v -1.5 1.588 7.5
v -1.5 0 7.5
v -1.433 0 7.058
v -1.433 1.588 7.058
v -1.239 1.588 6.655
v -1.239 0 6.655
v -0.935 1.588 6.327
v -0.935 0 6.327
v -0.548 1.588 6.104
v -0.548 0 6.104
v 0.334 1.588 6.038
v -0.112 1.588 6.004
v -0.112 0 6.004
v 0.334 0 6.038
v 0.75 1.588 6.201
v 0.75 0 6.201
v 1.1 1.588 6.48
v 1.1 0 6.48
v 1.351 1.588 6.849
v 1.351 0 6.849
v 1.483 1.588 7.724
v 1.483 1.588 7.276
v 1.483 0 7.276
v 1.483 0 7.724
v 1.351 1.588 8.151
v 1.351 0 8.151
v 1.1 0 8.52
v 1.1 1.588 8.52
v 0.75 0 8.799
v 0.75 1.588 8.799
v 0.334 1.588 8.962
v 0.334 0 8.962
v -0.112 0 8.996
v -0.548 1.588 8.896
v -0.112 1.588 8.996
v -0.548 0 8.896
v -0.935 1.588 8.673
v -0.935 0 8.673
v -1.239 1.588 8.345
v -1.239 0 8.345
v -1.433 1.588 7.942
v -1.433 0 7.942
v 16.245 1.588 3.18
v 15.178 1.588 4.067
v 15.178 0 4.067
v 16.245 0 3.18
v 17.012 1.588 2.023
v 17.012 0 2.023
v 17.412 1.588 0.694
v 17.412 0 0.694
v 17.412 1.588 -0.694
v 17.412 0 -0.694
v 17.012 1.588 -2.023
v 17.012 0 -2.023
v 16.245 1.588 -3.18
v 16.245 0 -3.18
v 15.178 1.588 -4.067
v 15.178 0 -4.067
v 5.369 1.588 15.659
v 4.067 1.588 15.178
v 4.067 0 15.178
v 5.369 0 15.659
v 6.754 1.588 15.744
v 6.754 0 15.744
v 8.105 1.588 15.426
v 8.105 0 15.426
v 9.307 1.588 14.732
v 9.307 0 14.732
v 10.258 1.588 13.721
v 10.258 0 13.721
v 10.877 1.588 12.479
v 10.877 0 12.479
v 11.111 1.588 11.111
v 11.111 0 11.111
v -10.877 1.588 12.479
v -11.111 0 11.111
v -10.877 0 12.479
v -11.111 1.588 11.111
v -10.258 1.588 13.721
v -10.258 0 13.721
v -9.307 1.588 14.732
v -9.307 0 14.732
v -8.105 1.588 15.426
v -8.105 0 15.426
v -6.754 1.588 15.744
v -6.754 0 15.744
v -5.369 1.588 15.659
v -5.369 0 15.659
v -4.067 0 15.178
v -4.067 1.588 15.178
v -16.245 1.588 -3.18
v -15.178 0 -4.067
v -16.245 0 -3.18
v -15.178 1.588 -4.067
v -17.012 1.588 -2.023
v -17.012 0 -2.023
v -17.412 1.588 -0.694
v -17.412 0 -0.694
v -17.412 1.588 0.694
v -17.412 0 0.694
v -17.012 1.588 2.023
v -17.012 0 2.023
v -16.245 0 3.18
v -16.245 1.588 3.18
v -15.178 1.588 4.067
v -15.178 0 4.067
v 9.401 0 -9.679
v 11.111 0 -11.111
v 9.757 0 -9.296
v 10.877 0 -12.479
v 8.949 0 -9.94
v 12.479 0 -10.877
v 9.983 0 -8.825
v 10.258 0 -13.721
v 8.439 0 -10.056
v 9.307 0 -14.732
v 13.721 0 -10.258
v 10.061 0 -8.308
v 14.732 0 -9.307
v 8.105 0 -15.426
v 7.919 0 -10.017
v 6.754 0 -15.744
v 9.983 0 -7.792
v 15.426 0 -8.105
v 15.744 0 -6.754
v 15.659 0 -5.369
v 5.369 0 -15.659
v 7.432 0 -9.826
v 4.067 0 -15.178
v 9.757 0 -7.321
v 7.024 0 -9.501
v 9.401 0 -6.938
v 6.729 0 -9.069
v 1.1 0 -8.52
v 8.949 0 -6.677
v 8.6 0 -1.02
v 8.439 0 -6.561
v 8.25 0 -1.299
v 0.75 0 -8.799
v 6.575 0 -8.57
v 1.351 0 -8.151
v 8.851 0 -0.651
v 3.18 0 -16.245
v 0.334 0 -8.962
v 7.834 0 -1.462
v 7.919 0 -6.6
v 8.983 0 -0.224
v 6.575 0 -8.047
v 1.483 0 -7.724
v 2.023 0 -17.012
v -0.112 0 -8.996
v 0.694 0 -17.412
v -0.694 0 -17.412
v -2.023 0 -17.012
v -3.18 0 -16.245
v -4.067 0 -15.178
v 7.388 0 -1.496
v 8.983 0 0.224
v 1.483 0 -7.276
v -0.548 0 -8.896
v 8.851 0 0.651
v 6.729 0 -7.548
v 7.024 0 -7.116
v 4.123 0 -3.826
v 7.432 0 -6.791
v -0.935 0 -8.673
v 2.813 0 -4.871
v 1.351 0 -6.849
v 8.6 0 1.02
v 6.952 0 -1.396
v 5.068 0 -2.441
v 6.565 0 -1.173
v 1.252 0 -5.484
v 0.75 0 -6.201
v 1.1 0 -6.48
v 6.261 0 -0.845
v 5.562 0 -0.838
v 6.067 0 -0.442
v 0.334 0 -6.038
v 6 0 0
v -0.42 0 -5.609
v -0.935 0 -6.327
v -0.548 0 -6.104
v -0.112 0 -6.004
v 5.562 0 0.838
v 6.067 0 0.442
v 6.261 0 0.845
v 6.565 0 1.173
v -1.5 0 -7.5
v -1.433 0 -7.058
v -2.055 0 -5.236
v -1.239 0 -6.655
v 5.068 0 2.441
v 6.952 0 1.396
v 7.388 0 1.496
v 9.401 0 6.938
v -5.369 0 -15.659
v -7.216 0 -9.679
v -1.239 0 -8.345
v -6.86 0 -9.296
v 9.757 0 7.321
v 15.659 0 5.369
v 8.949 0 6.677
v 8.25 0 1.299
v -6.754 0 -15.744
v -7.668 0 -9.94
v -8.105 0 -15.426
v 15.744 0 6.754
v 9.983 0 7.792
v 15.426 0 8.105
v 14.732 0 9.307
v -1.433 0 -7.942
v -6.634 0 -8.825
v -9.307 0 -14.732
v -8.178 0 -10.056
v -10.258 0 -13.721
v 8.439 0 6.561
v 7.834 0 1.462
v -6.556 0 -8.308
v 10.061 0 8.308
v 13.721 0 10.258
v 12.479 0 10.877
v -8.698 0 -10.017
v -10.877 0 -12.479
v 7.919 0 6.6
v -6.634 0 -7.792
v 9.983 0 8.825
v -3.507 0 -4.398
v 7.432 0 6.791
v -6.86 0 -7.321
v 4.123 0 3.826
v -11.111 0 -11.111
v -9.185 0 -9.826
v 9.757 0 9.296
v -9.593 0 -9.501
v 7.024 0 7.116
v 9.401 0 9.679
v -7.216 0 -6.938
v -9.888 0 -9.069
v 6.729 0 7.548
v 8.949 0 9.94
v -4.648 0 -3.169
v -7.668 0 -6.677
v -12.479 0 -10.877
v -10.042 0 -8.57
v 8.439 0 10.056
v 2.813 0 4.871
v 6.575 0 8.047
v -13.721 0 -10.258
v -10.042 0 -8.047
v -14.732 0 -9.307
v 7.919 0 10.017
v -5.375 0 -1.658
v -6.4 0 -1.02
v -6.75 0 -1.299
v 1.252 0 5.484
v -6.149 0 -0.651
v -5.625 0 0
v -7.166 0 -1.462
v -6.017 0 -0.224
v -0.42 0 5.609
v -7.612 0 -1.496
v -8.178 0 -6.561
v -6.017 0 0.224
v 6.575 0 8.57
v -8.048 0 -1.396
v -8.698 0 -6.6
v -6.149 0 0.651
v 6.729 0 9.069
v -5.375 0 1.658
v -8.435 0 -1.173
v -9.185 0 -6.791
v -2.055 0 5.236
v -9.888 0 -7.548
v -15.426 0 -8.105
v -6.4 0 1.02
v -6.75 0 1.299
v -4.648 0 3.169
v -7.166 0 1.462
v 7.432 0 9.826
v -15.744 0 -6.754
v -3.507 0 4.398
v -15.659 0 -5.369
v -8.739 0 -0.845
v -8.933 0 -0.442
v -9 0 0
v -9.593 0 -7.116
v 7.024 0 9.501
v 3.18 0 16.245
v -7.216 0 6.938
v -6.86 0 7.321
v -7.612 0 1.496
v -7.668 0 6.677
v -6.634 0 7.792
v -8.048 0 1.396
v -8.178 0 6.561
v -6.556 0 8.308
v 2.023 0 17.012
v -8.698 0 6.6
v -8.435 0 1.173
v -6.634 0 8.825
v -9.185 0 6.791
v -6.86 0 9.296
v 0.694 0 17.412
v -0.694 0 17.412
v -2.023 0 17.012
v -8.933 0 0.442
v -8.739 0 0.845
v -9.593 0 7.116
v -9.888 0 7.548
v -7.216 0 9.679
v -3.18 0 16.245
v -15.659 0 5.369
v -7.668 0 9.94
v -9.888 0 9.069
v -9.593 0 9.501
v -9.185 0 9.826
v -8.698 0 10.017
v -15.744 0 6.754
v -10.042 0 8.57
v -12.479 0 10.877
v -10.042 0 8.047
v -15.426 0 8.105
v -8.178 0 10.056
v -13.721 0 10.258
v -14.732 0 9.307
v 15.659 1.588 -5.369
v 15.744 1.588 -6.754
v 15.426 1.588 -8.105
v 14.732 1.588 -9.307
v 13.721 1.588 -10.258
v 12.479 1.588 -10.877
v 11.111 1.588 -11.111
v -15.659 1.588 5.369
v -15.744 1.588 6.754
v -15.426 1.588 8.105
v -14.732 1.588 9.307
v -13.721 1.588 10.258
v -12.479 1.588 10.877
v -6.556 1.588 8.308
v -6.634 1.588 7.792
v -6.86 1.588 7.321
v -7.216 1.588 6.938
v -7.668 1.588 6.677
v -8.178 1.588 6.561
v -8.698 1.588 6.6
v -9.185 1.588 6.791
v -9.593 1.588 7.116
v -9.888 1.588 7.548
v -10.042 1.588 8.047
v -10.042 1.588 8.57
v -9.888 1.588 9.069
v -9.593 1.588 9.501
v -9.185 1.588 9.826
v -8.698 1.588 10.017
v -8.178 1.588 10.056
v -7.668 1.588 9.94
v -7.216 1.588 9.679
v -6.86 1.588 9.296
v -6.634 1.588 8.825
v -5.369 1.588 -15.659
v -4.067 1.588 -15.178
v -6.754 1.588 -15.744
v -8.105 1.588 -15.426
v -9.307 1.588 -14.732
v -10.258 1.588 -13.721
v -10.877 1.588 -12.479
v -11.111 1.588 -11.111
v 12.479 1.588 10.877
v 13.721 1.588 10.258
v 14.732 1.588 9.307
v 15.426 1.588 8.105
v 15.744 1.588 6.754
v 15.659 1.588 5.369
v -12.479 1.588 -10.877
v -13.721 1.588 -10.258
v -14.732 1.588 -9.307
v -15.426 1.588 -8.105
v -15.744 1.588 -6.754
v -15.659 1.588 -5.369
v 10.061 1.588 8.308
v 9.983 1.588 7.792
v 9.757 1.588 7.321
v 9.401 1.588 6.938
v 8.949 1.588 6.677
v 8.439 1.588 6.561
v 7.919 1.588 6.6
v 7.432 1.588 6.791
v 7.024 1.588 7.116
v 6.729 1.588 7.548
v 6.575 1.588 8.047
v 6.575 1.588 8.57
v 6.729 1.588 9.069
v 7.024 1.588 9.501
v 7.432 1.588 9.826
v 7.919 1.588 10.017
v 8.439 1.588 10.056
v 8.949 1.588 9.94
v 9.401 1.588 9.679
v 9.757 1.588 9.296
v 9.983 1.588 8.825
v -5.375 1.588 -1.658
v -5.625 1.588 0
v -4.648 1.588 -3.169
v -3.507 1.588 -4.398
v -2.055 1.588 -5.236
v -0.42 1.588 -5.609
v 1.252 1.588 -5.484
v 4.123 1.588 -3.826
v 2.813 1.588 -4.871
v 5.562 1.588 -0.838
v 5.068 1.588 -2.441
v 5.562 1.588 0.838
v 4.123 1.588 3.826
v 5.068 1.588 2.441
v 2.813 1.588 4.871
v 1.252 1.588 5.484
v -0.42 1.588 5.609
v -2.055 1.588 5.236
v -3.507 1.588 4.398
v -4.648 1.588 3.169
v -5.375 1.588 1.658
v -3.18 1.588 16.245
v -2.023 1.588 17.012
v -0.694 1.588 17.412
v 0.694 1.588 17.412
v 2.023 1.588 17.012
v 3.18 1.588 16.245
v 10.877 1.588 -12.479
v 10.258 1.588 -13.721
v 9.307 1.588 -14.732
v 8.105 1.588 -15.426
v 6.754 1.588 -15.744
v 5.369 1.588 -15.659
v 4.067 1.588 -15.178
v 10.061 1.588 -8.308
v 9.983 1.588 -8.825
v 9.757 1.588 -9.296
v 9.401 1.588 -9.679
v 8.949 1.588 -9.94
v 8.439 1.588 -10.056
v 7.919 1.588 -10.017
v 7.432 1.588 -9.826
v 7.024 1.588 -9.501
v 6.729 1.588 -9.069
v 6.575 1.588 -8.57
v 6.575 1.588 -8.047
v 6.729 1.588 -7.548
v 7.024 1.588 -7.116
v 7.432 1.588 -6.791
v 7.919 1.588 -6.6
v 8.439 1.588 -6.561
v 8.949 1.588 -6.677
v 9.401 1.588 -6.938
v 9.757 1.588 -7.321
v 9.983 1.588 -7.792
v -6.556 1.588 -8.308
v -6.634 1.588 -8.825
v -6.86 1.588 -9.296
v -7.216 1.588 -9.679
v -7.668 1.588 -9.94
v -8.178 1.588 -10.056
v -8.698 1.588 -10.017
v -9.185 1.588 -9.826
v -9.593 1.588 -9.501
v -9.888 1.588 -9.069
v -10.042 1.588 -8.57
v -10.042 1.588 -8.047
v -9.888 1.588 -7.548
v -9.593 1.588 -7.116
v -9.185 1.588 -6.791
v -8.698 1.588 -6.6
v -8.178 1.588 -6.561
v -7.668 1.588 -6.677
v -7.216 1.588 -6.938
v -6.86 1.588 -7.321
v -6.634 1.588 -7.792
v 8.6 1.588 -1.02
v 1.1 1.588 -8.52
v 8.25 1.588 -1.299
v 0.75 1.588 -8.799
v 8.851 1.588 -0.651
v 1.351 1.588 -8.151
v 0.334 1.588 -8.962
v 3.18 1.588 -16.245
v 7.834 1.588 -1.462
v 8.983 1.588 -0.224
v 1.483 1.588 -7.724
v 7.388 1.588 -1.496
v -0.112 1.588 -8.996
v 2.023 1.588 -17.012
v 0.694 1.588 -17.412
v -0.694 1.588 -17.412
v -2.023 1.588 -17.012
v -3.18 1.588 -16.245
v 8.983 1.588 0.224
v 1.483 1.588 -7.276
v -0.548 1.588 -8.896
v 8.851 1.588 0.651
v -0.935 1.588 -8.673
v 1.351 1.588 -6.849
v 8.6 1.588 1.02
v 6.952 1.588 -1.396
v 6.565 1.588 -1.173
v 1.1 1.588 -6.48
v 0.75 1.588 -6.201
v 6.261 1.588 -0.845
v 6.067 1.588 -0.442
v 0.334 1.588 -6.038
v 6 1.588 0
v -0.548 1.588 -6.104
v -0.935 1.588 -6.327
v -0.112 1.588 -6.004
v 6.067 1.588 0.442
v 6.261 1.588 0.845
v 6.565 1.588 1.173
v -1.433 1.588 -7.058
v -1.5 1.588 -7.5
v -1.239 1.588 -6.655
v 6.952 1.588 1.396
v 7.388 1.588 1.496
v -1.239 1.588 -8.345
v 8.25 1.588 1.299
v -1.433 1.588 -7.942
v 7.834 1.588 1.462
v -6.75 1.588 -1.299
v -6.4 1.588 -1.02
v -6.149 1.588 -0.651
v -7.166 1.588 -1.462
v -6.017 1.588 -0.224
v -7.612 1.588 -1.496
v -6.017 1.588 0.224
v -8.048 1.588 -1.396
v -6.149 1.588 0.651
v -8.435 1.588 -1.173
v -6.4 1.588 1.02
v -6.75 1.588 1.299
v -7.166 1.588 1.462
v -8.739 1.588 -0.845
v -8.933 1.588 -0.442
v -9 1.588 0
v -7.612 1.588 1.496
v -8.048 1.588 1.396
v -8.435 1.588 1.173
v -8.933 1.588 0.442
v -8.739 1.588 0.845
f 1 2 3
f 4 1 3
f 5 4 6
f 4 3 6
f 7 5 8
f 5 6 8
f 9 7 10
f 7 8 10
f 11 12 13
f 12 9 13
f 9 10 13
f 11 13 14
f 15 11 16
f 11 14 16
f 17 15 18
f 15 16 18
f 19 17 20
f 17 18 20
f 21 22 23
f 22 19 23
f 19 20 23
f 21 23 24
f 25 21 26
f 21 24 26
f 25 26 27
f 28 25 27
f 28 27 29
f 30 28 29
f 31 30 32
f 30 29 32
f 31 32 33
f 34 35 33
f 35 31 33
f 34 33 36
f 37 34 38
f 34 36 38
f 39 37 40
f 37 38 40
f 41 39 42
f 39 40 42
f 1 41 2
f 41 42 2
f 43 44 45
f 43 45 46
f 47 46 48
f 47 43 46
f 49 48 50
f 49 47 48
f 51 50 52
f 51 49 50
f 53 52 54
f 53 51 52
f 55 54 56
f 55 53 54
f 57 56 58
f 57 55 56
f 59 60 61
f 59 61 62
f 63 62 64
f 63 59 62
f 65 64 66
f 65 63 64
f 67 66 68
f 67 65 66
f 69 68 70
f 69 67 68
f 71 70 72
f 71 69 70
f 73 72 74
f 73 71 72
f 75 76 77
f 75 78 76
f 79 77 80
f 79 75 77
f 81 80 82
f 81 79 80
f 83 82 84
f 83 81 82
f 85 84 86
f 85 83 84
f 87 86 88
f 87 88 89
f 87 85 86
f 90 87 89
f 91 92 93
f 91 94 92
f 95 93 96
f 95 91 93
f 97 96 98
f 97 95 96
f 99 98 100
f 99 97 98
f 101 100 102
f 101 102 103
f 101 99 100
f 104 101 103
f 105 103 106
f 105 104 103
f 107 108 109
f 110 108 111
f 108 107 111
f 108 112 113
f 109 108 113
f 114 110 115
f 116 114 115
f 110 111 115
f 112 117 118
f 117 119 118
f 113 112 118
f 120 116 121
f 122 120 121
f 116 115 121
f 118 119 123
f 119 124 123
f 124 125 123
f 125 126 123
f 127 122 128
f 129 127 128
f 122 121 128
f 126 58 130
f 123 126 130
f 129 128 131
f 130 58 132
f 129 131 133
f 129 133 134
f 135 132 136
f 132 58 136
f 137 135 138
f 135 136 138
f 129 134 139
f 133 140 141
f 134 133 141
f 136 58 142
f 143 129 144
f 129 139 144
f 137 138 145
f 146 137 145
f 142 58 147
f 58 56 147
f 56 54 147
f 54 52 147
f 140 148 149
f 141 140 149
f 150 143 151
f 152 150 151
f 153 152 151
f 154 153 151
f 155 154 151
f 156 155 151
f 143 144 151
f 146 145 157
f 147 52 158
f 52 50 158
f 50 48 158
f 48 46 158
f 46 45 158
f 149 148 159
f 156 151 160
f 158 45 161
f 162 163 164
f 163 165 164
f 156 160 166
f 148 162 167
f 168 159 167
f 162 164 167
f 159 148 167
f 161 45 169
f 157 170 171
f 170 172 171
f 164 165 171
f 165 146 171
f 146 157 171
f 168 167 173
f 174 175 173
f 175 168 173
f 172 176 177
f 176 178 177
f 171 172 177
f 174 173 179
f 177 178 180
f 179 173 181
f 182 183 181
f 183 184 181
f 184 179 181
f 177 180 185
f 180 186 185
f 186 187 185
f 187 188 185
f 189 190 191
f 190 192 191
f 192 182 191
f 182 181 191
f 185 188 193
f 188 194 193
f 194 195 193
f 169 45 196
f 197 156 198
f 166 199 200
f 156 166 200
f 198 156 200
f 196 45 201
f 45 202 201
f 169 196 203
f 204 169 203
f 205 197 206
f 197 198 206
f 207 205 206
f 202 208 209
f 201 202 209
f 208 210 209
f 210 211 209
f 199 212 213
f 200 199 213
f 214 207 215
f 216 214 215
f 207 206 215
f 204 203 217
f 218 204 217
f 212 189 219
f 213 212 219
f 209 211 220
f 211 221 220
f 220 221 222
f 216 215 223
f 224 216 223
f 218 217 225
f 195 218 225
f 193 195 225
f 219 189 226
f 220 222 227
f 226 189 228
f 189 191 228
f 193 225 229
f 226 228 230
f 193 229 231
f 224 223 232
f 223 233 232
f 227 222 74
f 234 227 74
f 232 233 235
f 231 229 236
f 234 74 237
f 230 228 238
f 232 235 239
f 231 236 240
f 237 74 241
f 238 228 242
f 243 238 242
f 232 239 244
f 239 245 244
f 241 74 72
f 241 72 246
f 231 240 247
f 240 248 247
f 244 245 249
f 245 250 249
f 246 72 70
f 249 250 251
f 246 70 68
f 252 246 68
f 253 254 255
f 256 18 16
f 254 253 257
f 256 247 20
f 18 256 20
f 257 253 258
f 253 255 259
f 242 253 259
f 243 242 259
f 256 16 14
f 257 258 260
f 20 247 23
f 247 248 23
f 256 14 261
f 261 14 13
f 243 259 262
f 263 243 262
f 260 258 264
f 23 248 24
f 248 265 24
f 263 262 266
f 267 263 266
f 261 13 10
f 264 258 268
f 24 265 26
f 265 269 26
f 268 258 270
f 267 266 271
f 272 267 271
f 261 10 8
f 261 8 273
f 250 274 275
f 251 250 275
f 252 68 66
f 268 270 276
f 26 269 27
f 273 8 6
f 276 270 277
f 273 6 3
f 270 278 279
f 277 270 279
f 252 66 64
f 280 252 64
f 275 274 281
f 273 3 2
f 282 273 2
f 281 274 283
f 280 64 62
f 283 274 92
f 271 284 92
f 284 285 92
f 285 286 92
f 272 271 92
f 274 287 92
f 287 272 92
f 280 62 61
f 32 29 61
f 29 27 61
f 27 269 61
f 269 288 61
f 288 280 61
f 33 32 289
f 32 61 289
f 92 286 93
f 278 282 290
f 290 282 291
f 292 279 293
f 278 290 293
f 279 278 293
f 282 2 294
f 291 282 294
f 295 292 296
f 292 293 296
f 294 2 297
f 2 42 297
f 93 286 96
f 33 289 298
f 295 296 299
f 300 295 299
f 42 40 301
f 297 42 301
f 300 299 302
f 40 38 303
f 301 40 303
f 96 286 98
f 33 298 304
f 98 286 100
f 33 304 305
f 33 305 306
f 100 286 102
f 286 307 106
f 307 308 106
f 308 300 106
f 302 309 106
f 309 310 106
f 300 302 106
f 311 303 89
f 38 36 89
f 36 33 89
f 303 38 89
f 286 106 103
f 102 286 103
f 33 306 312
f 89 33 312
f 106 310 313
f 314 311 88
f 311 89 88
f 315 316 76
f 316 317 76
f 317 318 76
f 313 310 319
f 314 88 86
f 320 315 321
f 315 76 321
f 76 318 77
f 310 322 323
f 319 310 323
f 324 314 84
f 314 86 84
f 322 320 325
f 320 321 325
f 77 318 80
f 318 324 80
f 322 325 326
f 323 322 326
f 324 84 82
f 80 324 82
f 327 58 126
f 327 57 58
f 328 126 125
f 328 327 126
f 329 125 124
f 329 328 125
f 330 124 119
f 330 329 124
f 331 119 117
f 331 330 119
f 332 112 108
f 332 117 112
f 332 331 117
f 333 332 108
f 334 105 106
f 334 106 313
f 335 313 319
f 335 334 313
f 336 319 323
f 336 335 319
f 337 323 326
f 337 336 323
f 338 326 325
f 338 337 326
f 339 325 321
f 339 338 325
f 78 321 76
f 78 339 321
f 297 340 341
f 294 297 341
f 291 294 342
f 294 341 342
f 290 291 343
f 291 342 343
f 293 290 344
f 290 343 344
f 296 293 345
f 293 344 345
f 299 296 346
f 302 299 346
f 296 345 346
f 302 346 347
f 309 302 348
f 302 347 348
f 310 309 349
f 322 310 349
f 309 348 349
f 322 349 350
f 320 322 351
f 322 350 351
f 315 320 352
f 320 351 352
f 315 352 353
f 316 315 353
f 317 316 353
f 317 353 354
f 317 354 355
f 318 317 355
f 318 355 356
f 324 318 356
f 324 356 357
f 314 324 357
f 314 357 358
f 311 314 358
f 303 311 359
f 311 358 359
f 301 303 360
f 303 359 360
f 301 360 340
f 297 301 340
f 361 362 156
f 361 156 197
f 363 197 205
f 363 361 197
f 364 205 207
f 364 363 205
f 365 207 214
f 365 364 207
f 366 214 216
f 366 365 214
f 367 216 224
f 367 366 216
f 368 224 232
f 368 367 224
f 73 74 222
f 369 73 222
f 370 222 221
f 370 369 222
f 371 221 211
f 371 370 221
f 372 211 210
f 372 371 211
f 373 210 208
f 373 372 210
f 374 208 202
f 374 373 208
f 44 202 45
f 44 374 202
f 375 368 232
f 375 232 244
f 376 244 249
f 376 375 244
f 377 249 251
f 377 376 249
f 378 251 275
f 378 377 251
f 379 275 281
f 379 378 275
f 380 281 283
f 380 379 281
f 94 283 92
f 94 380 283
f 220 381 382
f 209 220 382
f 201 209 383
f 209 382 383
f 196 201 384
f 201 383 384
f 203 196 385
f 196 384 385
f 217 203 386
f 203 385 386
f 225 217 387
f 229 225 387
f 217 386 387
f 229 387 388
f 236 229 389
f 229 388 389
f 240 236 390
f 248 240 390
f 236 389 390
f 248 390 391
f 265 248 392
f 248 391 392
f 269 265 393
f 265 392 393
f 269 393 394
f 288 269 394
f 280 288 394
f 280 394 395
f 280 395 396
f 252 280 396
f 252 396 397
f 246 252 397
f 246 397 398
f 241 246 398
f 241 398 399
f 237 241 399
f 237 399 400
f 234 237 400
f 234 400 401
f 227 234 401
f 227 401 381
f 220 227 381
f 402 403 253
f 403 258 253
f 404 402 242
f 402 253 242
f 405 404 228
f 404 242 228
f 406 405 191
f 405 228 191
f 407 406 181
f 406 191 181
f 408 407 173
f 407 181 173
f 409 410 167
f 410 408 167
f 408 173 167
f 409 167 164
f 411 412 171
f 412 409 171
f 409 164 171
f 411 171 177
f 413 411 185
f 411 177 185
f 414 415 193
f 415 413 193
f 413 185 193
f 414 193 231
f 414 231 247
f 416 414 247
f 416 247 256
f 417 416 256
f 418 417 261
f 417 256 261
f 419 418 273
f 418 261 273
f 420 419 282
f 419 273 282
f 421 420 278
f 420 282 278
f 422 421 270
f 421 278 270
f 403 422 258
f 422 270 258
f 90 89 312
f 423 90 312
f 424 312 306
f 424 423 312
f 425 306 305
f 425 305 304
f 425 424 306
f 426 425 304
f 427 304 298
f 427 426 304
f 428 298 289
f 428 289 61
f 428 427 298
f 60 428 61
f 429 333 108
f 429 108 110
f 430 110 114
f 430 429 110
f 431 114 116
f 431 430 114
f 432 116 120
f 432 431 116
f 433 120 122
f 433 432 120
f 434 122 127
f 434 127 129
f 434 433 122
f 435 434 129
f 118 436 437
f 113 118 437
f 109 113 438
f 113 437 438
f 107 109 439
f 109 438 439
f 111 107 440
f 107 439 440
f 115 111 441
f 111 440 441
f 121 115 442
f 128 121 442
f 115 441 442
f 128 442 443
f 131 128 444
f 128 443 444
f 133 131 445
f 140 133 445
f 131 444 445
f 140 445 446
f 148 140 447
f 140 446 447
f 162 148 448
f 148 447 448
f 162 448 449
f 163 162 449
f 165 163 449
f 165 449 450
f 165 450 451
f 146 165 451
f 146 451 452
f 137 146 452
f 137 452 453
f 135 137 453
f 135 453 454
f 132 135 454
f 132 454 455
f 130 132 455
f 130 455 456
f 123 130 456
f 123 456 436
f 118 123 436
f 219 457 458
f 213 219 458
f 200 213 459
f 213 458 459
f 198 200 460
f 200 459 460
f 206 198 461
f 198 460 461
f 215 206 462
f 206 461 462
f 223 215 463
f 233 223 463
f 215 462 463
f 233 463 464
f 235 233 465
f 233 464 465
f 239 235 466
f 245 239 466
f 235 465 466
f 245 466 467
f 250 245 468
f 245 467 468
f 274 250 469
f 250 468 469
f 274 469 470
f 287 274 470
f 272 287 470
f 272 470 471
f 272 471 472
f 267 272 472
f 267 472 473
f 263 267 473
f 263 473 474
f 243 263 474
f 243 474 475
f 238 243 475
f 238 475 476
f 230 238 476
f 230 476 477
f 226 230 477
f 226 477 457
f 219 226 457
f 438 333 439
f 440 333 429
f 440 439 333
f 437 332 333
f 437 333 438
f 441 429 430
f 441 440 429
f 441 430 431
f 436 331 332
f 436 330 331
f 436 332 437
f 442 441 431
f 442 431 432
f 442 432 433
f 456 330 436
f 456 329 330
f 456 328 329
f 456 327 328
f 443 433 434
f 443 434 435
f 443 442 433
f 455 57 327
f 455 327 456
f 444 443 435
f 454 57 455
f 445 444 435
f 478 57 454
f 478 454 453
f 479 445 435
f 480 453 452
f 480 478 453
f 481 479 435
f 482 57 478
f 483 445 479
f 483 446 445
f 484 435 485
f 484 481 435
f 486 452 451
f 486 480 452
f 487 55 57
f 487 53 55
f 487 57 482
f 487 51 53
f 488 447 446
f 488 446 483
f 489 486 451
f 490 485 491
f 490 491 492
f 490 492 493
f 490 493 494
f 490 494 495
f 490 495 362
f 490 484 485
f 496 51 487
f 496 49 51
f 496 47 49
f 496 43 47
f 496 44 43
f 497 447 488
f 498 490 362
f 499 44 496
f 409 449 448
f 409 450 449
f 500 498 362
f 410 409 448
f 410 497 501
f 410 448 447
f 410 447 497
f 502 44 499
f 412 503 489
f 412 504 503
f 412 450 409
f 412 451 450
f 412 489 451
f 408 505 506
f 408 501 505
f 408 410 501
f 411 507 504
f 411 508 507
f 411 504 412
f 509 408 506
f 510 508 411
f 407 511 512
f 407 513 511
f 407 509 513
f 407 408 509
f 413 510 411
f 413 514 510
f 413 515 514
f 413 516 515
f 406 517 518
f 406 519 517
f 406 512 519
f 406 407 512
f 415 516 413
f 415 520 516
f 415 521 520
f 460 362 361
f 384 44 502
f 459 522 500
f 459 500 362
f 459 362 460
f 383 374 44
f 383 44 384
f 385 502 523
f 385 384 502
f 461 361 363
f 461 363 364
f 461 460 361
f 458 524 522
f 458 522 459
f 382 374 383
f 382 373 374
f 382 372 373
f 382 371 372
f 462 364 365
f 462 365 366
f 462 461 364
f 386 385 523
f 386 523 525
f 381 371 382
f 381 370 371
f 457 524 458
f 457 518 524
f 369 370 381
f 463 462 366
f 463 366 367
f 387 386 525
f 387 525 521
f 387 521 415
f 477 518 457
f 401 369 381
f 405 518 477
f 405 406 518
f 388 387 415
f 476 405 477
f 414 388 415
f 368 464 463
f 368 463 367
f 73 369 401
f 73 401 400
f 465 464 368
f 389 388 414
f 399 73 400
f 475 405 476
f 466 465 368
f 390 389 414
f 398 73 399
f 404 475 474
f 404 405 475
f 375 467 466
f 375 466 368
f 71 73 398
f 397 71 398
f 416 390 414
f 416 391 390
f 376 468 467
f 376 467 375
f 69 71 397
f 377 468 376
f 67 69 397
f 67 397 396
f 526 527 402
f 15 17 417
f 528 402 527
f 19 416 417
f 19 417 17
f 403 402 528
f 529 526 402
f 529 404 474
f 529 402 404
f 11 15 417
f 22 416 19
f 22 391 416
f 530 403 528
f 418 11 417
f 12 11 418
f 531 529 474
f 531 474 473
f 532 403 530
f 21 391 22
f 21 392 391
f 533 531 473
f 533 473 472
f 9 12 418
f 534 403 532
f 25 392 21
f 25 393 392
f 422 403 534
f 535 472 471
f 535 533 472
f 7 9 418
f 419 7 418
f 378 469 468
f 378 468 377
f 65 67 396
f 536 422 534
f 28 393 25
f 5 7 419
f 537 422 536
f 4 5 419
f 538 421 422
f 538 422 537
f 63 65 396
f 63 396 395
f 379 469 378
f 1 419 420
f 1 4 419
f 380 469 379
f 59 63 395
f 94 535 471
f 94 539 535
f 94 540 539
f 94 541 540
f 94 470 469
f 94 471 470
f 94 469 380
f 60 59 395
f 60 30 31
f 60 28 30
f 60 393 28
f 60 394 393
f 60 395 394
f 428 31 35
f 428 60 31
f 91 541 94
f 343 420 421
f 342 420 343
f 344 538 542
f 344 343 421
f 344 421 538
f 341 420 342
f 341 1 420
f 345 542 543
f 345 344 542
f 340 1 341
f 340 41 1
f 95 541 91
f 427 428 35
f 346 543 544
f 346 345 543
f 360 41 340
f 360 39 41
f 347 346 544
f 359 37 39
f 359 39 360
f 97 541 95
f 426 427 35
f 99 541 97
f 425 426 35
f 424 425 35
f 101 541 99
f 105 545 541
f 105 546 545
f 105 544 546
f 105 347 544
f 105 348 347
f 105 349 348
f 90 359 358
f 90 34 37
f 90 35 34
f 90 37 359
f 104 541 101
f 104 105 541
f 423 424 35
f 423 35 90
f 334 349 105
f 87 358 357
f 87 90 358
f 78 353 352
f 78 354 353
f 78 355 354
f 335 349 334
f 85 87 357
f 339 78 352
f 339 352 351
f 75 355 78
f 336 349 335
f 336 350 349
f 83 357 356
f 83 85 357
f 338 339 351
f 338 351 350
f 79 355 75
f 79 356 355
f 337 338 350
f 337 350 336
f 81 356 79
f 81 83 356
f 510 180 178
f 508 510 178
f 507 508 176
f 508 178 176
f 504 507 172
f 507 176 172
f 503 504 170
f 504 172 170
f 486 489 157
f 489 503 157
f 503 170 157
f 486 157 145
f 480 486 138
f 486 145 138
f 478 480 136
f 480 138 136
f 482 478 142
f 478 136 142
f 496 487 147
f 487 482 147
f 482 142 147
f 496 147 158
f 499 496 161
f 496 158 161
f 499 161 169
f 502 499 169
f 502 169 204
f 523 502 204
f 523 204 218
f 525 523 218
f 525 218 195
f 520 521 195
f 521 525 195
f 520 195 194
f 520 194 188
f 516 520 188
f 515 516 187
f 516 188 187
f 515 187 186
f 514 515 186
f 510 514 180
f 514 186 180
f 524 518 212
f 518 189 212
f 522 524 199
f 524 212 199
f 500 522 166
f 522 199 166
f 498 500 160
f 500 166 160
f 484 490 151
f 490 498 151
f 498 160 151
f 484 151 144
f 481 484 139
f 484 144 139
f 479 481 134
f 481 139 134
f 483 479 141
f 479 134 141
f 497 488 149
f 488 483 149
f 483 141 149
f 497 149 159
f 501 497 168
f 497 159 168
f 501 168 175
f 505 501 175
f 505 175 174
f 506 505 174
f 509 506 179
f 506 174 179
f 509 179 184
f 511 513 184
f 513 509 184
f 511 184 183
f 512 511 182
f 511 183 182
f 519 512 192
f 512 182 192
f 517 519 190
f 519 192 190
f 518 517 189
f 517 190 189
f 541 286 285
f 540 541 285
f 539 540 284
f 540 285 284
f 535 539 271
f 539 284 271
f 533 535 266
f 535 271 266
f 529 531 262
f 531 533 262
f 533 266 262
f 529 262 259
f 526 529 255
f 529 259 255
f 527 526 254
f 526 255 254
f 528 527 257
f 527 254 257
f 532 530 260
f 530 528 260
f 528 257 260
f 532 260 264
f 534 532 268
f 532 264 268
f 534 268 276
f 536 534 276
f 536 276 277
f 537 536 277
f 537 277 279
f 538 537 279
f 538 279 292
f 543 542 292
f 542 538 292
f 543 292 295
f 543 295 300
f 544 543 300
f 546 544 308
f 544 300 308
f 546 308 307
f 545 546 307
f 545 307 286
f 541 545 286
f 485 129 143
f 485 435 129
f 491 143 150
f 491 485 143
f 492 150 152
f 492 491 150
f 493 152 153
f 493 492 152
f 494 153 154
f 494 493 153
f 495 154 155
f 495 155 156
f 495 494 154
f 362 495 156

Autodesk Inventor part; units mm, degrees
ref_plane "YZ Plane" through (0, 0, 0) normal (1, 0, 0) x (0, 1, 0)
ref_plane "XZ Plane" through (0, 0, 0) normal (0, 1, 0) x (-1, 0, 0)
ref_plane "XY Plane" through (0, 0, 0) normal (0, 0, 1) x (1, 0, 0)
sketch "Sketch1" plane through (0, 0, 0) normal (0, 1, 0) x (-1, 0, 0)
  circle A0 centre (0, 0) radius 5.625
  circle A1 centre (0, 0) radius 7.5 construction
  circle A2 centre (0, 0) radius 22.225 construction
  circle A3 centre (7.5, 0) radius 1.5
  line L0 (22.225, 0) -> (0, 0) construction
  circle A4 centre (0, 7.5) radius 1.5
  circle A5 centre (-7.5, 0) radius 1.5
  circle A6 centre (0, 0) radius 19.05
  circle A7 centre (0, -7.5) radius 1.5
  point P0 (0, 6)
  point P1 (6, 0)
  point P2 (0, -6)
  point P3 (-6, 0)
  dimension "d1" = 15
  dimension "d2" = 44.45
  dimension "d0" = 11.25
  dimension "d3" = 3
  dimension "d6" = 360
  dimension "d8" = 38.1
extrude "Extrusion1" add sketch "Sketch1" along normal blind 1.5875
sketch "Sketch2" plane through (0, 1.5875, 0) normal (0, 1, 0) x (1, 0, 0)
  circle A0 centre (0, 0) radius 11.75 construction
  line L0 (0, 0) -> (19.05, 0) construction
  circle A1 centre (0, 0) radius 19.05 projected
  line L1 (11.75, 0) -> (0, 0) construction
  line L2 (0, 0) -> (8.3085, -8.3085) construction
  circle A2 centre (8.3085, -8.3085) radius 1.7526
  circle A3 centre (8.3085, 8.3085) radius 1.7526
  circle A4 centre (-8.3085, 8.3085) radius 1.7526
  circle A5 centre (-8.3085, -8.3085) radius 1.7526
  dimension "d11" = 23.5
  dimension "d28" = 45
  dimension "d29" = 3.5052
  dimension "d32" = 360
extrude "Extrusion2" cut sketch "Sketch2" against normal through all contours A2 | A3 | A4 | A5
sketch "Sketch3" plane through (0, 1.5875, 0) normal (0, 1, 0) x (1, 0, 0)
  line L0 (0, 0) -> (12.7, 0) construction
  circle A0 centre (0, 0) radius 12.7 construction
  circle A1 centre (12.7, 0) radius 4.7625
  circle A2 centre (10.9985, 6.35) radius 4.7625
  circle A3 centre (6.35, 10.9985) radius 4.7625
  circle A4 centre (0, 12.7) radius 4.7625
  circle A5 centre (-6.35, 10.9985) radius 4.7625
  circle A6 centre (-10.9985, 6.35) radius 4.7625
  circle A7 centre (-12.7, 0) radius 4.7625
  circle A8 centre (-10.9985, -6.35) radius 4.7625
  circle A9 centre (-6.35, -10.9985) radius 4.7625
  circle A10 centre (0, -12.7) radius 4.7625
  circle A11 centre (6.35, -10.9985) radius 4.7625
  circle A12 centre (10.9985, -6.35) radius 4.7625
  circle A13 centre (0, 0) radius 19.05
  point P0 (11.1112, -11.1112)
  point P1 (4.067, -15.1781)
  point P2 (-4.067, -15.1781)
  point P3 (-11.1112, -11.1112)
  point P4 (-15.1781, -4.067)
  point P5 (-15.1781, 4.067)
  point P6 (-11.1112, 11.1112)
  point P7 (-4.067, 15.1781)
  point P8 (4.067, 15.1781)
  point P9 (11.1112, 11.1112)
  point P10 (15.1781, 4.067)
  point P11 (15.1781, -4.067)
  dimension "d19" = 25.4
  dimension "d20" = 9.525
  dimension "d23" = 360
  dimension "d25" = 38.1
extrude "Extrusion3" cut sketch "Sketch3" against normal blind 25.4
properties part number "Motor Cap" material "Nylon 6/6"
